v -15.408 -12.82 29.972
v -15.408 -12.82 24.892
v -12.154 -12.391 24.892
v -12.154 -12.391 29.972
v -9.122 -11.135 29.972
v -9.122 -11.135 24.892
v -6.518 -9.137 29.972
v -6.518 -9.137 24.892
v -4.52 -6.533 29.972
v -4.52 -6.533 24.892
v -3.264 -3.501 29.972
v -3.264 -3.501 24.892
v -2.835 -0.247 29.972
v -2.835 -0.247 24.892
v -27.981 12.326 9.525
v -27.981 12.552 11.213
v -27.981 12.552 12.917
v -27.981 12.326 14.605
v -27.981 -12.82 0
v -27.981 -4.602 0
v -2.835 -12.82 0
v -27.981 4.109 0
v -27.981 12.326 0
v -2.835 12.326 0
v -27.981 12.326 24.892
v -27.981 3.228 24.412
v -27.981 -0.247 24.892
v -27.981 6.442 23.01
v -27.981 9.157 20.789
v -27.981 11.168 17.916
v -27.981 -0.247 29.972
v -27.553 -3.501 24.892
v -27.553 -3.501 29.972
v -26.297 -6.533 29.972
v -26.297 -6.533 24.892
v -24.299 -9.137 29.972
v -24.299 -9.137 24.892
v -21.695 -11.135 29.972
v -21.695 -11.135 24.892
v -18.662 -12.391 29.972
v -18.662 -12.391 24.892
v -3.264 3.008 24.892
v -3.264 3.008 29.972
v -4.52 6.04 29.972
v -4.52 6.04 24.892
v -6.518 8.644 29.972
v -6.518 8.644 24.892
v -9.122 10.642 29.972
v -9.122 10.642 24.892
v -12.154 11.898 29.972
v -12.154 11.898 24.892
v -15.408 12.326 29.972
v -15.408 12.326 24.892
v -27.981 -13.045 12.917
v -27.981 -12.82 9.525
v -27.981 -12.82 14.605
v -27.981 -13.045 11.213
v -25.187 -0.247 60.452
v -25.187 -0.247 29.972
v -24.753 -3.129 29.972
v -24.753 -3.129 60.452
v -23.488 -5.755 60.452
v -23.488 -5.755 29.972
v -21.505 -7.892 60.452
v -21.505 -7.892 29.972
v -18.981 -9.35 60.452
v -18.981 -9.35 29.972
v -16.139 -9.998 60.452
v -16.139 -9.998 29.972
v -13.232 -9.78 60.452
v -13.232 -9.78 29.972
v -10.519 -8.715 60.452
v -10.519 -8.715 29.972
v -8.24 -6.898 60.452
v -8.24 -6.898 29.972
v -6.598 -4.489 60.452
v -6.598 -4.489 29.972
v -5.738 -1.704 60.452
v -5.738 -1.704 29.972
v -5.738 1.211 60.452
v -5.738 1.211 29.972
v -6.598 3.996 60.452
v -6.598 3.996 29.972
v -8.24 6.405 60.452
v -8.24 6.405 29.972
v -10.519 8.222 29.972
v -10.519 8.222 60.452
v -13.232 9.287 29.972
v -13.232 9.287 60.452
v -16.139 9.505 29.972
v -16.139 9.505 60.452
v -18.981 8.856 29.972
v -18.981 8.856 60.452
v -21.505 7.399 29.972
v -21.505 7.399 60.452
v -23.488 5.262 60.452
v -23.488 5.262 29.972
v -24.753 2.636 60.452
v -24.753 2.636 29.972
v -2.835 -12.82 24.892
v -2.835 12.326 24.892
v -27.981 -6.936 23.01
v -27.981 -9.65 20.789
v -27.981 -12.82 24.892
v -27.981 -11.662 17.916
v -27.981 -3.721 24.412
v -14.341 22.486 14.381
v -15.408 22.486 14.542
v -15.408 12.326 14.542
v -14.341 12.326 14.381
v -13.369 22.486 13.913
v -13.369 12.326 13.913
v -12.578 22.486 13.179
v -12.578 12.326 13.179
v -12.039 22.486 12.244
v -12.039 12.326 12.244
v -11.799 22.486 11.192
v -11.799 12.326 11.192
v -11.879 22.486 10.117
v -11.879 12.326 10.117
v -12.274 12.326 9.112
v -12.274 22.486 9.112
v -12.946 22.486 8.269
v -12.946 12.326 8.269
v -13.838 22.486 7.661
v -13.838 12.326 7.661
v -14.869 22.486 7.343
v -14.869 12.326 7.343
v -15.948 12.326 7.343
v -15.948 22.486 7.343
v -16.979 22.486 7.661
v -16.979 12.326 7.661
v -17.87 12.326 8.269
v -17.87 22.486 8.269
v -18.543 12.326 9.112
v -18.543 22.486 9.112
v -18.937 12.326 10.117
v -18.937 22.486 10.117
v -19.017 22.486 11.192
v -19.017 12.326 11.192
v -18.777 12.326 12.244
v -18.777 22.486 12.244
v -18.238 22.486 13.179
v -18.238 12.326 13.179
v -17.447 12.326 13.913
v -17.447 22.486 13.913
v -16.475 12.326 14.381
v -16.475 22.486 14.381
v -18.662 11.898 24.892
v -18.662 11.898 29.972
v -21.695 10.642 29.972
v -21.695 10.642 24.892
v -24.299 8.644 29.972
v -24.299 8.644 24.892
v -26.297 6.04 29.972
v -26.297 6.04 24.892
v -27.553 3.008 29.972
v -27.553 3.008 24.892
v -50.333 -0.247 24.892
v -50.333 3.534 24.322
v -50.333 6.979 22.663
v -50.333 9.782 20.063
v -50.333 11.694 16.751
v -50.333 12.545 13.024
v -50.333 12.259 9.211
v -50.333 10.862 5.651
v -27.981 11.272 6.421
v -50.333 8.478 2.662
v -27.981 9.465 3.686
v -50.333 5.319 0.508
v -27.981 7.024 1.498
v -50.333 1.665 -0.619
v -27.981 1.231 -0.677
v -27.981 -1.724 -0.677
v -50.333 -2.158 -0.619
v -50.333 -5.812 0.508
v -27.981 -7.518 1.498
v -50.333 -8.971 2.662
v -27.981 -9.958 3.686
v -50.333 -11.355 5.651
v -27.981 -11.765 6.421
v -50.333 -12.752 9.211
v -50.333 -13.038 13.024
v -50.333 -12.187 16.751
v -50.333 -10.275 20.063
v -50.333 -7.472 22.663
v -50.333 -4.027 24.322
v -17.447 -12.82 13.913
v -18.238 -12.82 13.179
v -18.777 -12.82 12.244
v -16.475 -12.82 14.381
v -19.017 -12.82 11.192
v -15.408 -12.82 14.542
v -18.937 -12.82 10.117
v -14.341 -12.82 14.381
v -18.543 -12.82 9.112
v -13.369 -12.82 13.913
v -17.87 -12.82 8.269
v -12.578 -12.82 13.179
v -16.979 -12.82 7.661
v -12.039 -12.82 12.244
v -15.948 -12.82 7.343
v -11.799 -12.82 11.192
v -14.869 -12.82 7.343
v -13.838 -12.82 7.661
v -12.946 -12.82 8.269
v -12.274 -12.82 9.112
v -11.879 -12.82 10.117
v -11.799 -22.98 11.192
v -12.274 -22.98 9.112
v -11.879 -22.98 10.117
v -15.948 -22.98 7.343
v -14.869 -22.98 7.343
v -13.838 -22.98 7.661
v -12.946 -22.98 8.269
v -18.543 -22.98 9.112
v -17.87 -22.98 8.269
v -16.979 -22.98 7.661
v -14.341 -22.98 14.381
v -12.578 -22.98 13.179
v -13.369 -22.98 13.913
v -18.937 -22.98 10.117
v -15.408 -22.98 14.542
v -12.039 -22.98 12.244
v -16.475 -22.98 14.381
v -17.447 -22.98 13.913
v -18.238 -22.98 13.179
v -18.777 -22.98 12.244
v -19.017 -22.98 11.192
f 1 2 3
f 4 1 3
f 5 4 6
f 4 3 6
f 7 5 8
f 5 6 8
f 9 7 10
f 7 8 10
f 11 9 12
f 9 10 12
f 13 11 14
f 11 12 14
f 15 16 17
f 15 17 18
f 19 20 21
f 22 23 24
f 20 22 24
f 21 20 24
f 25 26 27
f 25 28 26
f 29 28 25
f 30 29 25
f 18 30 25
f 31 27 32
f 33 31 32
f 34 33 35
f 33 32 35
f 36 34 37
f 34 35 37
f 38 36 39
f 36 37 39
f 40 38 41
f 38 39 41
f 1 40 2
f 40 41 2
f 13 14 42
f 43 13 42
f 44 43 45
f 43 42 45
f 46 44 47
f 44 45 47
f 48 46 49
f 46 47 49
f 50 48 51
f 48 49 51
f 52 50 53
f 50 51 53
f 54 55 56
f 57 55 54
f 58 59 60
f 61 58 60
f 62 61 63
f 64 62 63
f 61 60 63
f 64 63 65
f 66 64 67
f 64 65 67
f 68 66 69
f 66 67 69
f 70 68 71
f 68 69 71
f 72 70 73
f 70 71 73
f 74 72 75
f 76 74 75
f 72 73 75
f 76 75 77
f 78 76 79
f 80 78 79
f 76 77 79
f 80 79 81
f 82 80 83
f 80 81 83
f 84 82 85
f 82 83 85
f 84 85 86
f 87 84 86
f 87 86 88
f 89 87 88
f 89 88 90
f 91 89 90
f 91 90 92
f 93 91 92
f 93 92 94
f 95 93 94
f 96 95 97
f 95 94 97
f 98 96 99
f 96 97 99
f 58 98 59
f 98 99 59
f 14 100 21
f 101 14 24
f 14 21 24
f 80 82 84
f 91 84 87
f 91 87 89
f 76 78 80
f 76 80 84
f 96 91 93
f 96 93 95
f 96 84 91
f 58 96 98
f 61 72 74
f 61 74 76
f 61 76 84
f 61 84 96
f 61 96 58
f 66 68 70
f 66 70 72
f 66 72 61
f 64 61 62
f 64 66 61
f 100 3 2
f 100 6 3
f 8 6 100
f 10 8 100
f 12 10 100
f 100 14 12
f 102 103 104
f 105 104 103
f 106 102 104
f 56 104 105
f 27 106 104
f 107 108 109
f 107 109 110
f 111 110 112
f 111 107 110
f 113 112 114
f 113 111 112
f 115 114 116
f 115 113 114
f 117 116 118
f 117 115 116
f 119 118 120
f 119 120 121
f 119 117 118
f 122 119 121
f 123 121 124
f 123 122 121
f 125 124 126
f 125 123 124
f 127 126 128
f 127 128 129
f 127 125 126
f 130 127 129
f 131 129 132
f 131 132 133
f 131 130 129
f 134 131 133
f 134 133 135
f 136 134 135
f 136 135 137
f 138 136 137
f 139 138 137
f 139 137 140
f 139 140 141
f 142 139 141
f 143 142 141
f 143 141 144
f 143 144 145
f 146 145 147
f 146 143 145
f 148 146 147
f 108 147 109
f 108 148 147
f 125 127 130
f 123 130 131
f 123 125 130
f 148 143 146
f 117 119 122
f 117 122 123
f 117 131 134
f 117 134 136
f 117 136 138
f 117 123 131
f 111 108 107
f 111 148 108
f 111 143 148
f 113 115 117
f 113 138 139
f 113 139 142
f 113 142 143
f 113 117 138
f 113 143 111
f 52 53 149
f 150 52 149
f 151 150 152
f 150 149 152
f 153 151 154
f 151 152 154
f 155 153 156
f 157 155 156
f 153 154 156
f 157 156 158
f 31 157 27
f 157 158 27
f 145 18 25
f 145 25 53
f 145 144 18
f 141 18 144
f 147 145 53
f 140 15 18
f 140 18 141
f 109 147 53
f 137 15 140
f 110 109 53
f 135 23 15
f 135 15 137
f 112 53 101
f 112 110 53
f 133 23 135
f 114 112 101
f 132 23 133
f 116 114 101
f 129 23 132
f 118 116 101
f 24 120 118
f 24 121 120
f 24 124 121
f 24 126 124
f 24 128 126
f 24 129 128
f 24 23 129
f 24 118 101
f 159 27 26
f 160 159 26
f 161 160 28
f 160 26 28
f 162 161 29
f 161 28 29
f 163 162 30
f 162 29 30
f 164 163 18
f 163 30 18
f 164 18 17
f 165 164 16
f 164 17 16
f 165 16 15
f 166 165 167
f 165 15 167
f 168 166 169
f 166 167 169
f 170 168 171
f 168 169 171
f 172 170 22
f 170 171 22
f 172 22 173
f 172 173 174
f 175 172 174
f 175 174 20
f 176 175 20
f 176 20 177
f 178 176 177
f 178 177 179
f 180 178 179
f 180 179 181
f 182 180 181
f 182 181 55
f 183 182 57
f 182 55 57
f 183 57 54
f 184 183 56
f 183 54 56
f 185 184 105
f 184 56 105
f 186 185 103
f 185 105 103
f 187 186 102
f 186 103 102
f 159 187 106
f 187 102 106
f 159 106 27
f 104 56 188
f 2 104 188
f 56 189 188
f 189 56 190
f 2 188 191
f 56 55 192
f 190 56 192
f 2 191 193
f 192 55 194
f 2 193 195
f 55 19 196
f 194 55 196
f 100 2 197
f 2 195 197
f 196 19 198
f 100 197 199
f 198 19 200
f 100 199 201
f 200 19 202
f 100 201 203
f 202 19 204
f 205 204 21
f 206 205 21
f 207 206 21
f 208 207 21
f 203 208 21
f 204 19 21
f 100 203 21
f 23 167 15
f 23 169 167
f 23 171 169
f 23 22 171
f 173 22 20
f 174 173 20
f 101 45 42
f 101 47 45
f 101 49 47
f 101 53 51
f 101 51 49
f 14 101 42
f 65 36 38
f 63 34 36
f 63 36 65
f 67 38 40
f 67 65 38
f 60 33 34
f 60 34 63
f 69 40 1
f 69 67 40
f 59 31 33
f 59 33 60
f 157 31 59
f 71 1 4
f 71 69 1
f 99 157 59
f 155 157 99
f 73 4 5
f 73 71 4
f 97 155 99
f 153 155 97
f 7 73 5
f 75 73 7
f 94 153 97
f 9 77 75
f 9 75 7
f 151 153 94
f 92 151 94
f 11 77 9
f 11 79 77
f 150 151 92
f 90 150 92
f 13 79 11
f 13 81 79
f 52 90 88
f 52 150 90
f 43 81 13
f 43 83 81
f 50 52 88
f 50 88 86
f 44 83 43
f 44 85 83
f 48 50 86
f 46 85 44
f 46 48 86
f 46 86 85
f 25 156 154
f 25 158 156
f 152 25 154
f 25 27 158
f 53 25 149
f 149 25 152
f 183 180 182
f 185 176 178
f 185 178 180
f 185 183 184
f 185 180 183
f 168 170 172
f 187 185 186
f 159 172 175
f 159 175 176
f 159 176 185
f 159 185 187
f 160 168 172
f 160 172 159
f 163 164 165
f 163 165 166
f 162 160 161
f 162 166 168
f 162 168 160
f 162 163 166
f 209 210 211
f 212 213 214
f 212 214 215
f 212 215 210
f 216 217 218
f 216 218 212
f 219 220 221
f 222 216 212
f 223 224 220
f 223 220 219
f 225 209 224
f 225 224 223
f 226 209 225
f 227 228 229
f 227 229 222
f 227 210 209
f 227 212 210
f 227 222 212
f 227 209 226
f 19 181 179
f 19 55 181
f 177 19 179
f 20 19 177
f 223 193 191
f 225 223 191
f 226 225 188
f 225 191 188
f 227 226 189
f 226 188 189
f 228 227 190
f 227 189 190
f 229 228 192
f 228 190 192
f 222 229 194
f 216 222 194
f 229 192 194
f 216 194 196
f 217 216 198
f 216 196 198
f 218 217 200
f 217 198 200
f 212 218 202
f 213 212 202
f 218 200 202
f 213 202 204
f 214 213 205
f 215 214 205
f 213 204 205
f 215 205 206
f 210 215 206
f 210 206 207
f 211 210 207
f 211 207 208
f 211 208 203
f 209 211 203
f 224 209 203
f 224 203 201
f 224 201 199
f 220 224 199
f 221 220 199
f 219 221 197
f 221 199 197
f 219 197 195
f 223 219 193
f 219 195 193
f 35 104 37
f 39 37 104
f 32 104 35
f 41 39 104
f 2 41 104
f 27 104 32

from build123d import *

# Parameters (mm, degrees)
SKETCH1_W           = 25.146
SKETCH1_H           = 25.146
BOSS_EXTRUDE1_DEPTH = 24.892
BOSS_EXTRUDE2_DEPTH = 5.08
SKETCH3_R           = 9.779
BOSS_EXTRUDE3_DEPTH = 30.48
SKETCH4_R           = 12.827
BOSS_EXTRUDE4_DEPTH = 22.352
SKETCH5_R           = 3.6195
BOSS_EXTRUDE5_DEPTH = 10.16
BOSS_EXTRUDE6_START = 10.16
SKETCH6_R           = 3.6195
BOSS_EXTRUDE6_DEPTH = 10.16


with BuildPart() as part:
    # Sketch1 → Boss-Extrude1 (new body)
    with BuildSketch(Plane.XY):
        with Locations((-15.408088235, -0.246529412)):
            Rectangle(SKETCH1_W, SKETCH1_H)
    extrude(amount=BOSS_EXTRUDE1_DEPTH)

    # Sketch2 → Boss-Extrude2 (add)
    with BuildSketch(Plane.XY.offset(24.892)):
        with BuildLine():
            ThreePointArc((-2.835088235, -0.246529412), (-6.517634675, 8.643924148), (-15.408088235, 12.326470588))
            Line((-15.408088235, 12.326470588), (-15.408088235, -0.246529412))
            Line((-15.408088235, -0.246529412), (-2.835088235, -0.246529412))
        make_face()
        with BuildLine():
            Line((-15.408088235, -0.246529412), (-15.408088235, 12.326470588))
            ThreePointArc((-15.408088235, 12.326470588), (-24.298541795, 8.643924148), (-27.981088235, -0.246529412))
            Line((-27.981088235, -0.246529412), (-15.408088235, -0.246529412))
        make_face()
        with BuildLine():
            Line((-2.835088235, -0.246529412), (-15.408088235, -0.246529412))
            Line((-15.408088235, -0.246529412), (-15.408088235, -12.819529412))
            ThreePointArc((-15.408088235, -12.819529412), (-6.517634675, -9.136982972), (-2.835088235, -0.246529412))
        make_face()
        with BuildLine():
            Line((-15.408088235, -12.819529412), (-15.408088235, -0.246529412))
            Line((-15.408088235, -0.246529412), (-27.981088235, -0.246529412))
            ThreePointArc((-27.981088235, -0.246529412), (-24.298541795, -9.136982972), (-15.408088235, -12.819529412))
        make_face()
        with BuildLine():
            ThreePointArc((-2.835088235, -0.246529412), (-6.517634675, 8.643924148), (-15.408088235, 12.326470588))
            Line((-15.408088235, 12.326470588), (-15.408088235, -0.246529412))
            Line((-15.408088235, -0.246529412), (-2.835088235, -0.246529412))
        make_face()
        with BuildLine():
            Line((-15.408088235, -0.246529412), (-15.408088235, 12.326470588))
            ThreePointArc((-15.408088235, 12.326470588), (-24.298541795, 8.643924148), (-27.981088235, -0.246529412))
            Line((-27.981088235, -0.246529412), (-15.408088235, -0.246529412))
        make_face()
        with BuildLine():
            Line((-2.835088235, -0.246529412), (-15.408088235, -0.246529412))
            Line((-15.408088235, -0.246529412), (-15.408088235, -12.819529412))
            ThreePointArc((-15.408088235, -12.819529412), (-6.517634675, -9.136982972), (-2.835088235, -0.246529412))
        make_face()
        with BuildLine():
            Line((-15.408088235, -12.819529412), (-15.408088235, -0.246529412))
            Line((-15.408088235, -0.246529412), (-27.981088235, -0.246529412))
            ThreePointArc((-27.981088235, -0.246529412), (-24.298541795, -9.136982972), (-15.408088235, -12.819529412))
        make_face()
        with BuildLine():
            ThreePointArc((-2.835088235, -0.246529412), (-6.517634675, 8.643924148), (-15.408088235, 12.326470588))
            Line((-15.408088235, 12.326470588), (-15.408088235, -0.246529412))
            Line((-15.408088235, -0.246529412), (-2.835088235, -0.246529412))
        make_face()
        with BuildLine():
            Line((-15.408088235, -0.246529412), (-15.408088235, 12.326470588))
            ThreePointArc((-15.408088235, 12.326470588), (-24.298541795, 8.643924148), (-27.981088235, -0.246529412))
            Line((-27.981088235, -0.246529412), (-15.408088235, -0.246529412))
        make_face()
        with BuildLine():
            Line((-2.835088235, -0.246529412), (-15.408088235, -0.246529412))
            Line((-15.408088235, -0.246529412), (-15.408088235, -12.819529412))
            ThreePointArc((-15.408088235, -12.819529412), (-6.517634675, -9.136982972), (-2.835088235, -0.246529412))
        make_face()
        with BuildLine():
            Line((-15.408088235, -12.819529412), (-15.408088235, -0.246529412))
            Line((-15.408088235, -0.246529412), (-27.981088235, -0.246529412))
            ThreePointArc((-27.981088235, -0.246529412), (-24.298541795, -9.136982972), (-15.408088235, -12.819529412))
        make_face()
        with BuildLine():
            ThreePointArc((-2.835088235, -0.246529412), (-6.517634675, 8.643924148), (-15.408088235, 12.326470588))
            Line((-15.408088235, 12.326470588), (-15.408088235, -0.246529412))
            Line((-15.408088235, -0.246529412), (-2.835088235, -0.246529412))
        make_face()
        with BuildLine():
            Line((-15.408088235, -0.246529412), (-15.408088235, 12.326470588))
            ThreePointArc((-15.408088235, 12.326470588), (-24.298541795, 8.643924148), (-27.981088235, -0.246529412))
            Line((-27.981088235, -0.246529412), (-15.408088235, -0.246529412))
        make_face()
        with BuildLine():
            Line((-2.835088235, -0.246529412), (-15.408088235, -0.246529412))
            Line((-15.408088235, -0.246529412), (-15.408088235, -12.819529412))
            ThreePointArc((-15.408088235, -12.819529412), (-6.517634675, -9.136982972), (-2.835088235, -0.246529412))
        make_face()
        with BuildLine():
            Line((-15.408088235, -12.819529412), (-15.408088235, -0.246529412))
            Line((-15.408088235, -0.246529412), (-27.981088235, -0.246529412))
            ThreePointArc((-27.981088235, -0.246529412), (-24.298541795, -9.136982972), (-15.408088235, -12.819529412))
        make_face()
    extrude(amount=BOSS_EXTRUDE2_DEPTH)

    # Sketch3 → Boss-Extrude3 (add)
    with BuildSketch(Plane.XY.offset(29.972)):
        with Locations(Location((-15.408088235, -0.246529412, 0), (0, 0, 180))):
            Circle(SKETCH3_R)
    extrude(amount=BOSS_EXTRUDE3_DEPTH)

    # Sketch4 → Boss-Extrude4 (add)
    with BuildSketch(Plane.ZY.offset(27.981088235)):
        with Locations((12.065, -0.246529412)):
            Circle(SKETCH4_R)
    extrude(amount=BOSS_EXTRUDE4_DEPTH)

    # Sketch5 → Boss-Extrude5 (add)
    with BuildSketch(Plane.XZ.offset(12.819529412)):
        with Locations(Location((-15.408088235, 10.922, 0), (0, 0, 90))):
            Circle(SKETCH5_R)
    extrude(amount=BOSS_EXTRUDE5_DEPTH)

    # Sketch6 → Boss-Extrude6 (add)
    with BuildSketch(Plane(origin=(0, 12.326470588, 0), x_dir=(1, 0, 0), z_dir=(0, 1, 0)).offset(BOSS_EXTRUDE6_START)):
        with Locations(Location((-15.408088235, -10.922, 0), (0, 0, 270))):
            Circle(SKETCH6_R)
    extrude(amount=-BOSS_EXTRUDE6_DEPTH)


solid = part.part
